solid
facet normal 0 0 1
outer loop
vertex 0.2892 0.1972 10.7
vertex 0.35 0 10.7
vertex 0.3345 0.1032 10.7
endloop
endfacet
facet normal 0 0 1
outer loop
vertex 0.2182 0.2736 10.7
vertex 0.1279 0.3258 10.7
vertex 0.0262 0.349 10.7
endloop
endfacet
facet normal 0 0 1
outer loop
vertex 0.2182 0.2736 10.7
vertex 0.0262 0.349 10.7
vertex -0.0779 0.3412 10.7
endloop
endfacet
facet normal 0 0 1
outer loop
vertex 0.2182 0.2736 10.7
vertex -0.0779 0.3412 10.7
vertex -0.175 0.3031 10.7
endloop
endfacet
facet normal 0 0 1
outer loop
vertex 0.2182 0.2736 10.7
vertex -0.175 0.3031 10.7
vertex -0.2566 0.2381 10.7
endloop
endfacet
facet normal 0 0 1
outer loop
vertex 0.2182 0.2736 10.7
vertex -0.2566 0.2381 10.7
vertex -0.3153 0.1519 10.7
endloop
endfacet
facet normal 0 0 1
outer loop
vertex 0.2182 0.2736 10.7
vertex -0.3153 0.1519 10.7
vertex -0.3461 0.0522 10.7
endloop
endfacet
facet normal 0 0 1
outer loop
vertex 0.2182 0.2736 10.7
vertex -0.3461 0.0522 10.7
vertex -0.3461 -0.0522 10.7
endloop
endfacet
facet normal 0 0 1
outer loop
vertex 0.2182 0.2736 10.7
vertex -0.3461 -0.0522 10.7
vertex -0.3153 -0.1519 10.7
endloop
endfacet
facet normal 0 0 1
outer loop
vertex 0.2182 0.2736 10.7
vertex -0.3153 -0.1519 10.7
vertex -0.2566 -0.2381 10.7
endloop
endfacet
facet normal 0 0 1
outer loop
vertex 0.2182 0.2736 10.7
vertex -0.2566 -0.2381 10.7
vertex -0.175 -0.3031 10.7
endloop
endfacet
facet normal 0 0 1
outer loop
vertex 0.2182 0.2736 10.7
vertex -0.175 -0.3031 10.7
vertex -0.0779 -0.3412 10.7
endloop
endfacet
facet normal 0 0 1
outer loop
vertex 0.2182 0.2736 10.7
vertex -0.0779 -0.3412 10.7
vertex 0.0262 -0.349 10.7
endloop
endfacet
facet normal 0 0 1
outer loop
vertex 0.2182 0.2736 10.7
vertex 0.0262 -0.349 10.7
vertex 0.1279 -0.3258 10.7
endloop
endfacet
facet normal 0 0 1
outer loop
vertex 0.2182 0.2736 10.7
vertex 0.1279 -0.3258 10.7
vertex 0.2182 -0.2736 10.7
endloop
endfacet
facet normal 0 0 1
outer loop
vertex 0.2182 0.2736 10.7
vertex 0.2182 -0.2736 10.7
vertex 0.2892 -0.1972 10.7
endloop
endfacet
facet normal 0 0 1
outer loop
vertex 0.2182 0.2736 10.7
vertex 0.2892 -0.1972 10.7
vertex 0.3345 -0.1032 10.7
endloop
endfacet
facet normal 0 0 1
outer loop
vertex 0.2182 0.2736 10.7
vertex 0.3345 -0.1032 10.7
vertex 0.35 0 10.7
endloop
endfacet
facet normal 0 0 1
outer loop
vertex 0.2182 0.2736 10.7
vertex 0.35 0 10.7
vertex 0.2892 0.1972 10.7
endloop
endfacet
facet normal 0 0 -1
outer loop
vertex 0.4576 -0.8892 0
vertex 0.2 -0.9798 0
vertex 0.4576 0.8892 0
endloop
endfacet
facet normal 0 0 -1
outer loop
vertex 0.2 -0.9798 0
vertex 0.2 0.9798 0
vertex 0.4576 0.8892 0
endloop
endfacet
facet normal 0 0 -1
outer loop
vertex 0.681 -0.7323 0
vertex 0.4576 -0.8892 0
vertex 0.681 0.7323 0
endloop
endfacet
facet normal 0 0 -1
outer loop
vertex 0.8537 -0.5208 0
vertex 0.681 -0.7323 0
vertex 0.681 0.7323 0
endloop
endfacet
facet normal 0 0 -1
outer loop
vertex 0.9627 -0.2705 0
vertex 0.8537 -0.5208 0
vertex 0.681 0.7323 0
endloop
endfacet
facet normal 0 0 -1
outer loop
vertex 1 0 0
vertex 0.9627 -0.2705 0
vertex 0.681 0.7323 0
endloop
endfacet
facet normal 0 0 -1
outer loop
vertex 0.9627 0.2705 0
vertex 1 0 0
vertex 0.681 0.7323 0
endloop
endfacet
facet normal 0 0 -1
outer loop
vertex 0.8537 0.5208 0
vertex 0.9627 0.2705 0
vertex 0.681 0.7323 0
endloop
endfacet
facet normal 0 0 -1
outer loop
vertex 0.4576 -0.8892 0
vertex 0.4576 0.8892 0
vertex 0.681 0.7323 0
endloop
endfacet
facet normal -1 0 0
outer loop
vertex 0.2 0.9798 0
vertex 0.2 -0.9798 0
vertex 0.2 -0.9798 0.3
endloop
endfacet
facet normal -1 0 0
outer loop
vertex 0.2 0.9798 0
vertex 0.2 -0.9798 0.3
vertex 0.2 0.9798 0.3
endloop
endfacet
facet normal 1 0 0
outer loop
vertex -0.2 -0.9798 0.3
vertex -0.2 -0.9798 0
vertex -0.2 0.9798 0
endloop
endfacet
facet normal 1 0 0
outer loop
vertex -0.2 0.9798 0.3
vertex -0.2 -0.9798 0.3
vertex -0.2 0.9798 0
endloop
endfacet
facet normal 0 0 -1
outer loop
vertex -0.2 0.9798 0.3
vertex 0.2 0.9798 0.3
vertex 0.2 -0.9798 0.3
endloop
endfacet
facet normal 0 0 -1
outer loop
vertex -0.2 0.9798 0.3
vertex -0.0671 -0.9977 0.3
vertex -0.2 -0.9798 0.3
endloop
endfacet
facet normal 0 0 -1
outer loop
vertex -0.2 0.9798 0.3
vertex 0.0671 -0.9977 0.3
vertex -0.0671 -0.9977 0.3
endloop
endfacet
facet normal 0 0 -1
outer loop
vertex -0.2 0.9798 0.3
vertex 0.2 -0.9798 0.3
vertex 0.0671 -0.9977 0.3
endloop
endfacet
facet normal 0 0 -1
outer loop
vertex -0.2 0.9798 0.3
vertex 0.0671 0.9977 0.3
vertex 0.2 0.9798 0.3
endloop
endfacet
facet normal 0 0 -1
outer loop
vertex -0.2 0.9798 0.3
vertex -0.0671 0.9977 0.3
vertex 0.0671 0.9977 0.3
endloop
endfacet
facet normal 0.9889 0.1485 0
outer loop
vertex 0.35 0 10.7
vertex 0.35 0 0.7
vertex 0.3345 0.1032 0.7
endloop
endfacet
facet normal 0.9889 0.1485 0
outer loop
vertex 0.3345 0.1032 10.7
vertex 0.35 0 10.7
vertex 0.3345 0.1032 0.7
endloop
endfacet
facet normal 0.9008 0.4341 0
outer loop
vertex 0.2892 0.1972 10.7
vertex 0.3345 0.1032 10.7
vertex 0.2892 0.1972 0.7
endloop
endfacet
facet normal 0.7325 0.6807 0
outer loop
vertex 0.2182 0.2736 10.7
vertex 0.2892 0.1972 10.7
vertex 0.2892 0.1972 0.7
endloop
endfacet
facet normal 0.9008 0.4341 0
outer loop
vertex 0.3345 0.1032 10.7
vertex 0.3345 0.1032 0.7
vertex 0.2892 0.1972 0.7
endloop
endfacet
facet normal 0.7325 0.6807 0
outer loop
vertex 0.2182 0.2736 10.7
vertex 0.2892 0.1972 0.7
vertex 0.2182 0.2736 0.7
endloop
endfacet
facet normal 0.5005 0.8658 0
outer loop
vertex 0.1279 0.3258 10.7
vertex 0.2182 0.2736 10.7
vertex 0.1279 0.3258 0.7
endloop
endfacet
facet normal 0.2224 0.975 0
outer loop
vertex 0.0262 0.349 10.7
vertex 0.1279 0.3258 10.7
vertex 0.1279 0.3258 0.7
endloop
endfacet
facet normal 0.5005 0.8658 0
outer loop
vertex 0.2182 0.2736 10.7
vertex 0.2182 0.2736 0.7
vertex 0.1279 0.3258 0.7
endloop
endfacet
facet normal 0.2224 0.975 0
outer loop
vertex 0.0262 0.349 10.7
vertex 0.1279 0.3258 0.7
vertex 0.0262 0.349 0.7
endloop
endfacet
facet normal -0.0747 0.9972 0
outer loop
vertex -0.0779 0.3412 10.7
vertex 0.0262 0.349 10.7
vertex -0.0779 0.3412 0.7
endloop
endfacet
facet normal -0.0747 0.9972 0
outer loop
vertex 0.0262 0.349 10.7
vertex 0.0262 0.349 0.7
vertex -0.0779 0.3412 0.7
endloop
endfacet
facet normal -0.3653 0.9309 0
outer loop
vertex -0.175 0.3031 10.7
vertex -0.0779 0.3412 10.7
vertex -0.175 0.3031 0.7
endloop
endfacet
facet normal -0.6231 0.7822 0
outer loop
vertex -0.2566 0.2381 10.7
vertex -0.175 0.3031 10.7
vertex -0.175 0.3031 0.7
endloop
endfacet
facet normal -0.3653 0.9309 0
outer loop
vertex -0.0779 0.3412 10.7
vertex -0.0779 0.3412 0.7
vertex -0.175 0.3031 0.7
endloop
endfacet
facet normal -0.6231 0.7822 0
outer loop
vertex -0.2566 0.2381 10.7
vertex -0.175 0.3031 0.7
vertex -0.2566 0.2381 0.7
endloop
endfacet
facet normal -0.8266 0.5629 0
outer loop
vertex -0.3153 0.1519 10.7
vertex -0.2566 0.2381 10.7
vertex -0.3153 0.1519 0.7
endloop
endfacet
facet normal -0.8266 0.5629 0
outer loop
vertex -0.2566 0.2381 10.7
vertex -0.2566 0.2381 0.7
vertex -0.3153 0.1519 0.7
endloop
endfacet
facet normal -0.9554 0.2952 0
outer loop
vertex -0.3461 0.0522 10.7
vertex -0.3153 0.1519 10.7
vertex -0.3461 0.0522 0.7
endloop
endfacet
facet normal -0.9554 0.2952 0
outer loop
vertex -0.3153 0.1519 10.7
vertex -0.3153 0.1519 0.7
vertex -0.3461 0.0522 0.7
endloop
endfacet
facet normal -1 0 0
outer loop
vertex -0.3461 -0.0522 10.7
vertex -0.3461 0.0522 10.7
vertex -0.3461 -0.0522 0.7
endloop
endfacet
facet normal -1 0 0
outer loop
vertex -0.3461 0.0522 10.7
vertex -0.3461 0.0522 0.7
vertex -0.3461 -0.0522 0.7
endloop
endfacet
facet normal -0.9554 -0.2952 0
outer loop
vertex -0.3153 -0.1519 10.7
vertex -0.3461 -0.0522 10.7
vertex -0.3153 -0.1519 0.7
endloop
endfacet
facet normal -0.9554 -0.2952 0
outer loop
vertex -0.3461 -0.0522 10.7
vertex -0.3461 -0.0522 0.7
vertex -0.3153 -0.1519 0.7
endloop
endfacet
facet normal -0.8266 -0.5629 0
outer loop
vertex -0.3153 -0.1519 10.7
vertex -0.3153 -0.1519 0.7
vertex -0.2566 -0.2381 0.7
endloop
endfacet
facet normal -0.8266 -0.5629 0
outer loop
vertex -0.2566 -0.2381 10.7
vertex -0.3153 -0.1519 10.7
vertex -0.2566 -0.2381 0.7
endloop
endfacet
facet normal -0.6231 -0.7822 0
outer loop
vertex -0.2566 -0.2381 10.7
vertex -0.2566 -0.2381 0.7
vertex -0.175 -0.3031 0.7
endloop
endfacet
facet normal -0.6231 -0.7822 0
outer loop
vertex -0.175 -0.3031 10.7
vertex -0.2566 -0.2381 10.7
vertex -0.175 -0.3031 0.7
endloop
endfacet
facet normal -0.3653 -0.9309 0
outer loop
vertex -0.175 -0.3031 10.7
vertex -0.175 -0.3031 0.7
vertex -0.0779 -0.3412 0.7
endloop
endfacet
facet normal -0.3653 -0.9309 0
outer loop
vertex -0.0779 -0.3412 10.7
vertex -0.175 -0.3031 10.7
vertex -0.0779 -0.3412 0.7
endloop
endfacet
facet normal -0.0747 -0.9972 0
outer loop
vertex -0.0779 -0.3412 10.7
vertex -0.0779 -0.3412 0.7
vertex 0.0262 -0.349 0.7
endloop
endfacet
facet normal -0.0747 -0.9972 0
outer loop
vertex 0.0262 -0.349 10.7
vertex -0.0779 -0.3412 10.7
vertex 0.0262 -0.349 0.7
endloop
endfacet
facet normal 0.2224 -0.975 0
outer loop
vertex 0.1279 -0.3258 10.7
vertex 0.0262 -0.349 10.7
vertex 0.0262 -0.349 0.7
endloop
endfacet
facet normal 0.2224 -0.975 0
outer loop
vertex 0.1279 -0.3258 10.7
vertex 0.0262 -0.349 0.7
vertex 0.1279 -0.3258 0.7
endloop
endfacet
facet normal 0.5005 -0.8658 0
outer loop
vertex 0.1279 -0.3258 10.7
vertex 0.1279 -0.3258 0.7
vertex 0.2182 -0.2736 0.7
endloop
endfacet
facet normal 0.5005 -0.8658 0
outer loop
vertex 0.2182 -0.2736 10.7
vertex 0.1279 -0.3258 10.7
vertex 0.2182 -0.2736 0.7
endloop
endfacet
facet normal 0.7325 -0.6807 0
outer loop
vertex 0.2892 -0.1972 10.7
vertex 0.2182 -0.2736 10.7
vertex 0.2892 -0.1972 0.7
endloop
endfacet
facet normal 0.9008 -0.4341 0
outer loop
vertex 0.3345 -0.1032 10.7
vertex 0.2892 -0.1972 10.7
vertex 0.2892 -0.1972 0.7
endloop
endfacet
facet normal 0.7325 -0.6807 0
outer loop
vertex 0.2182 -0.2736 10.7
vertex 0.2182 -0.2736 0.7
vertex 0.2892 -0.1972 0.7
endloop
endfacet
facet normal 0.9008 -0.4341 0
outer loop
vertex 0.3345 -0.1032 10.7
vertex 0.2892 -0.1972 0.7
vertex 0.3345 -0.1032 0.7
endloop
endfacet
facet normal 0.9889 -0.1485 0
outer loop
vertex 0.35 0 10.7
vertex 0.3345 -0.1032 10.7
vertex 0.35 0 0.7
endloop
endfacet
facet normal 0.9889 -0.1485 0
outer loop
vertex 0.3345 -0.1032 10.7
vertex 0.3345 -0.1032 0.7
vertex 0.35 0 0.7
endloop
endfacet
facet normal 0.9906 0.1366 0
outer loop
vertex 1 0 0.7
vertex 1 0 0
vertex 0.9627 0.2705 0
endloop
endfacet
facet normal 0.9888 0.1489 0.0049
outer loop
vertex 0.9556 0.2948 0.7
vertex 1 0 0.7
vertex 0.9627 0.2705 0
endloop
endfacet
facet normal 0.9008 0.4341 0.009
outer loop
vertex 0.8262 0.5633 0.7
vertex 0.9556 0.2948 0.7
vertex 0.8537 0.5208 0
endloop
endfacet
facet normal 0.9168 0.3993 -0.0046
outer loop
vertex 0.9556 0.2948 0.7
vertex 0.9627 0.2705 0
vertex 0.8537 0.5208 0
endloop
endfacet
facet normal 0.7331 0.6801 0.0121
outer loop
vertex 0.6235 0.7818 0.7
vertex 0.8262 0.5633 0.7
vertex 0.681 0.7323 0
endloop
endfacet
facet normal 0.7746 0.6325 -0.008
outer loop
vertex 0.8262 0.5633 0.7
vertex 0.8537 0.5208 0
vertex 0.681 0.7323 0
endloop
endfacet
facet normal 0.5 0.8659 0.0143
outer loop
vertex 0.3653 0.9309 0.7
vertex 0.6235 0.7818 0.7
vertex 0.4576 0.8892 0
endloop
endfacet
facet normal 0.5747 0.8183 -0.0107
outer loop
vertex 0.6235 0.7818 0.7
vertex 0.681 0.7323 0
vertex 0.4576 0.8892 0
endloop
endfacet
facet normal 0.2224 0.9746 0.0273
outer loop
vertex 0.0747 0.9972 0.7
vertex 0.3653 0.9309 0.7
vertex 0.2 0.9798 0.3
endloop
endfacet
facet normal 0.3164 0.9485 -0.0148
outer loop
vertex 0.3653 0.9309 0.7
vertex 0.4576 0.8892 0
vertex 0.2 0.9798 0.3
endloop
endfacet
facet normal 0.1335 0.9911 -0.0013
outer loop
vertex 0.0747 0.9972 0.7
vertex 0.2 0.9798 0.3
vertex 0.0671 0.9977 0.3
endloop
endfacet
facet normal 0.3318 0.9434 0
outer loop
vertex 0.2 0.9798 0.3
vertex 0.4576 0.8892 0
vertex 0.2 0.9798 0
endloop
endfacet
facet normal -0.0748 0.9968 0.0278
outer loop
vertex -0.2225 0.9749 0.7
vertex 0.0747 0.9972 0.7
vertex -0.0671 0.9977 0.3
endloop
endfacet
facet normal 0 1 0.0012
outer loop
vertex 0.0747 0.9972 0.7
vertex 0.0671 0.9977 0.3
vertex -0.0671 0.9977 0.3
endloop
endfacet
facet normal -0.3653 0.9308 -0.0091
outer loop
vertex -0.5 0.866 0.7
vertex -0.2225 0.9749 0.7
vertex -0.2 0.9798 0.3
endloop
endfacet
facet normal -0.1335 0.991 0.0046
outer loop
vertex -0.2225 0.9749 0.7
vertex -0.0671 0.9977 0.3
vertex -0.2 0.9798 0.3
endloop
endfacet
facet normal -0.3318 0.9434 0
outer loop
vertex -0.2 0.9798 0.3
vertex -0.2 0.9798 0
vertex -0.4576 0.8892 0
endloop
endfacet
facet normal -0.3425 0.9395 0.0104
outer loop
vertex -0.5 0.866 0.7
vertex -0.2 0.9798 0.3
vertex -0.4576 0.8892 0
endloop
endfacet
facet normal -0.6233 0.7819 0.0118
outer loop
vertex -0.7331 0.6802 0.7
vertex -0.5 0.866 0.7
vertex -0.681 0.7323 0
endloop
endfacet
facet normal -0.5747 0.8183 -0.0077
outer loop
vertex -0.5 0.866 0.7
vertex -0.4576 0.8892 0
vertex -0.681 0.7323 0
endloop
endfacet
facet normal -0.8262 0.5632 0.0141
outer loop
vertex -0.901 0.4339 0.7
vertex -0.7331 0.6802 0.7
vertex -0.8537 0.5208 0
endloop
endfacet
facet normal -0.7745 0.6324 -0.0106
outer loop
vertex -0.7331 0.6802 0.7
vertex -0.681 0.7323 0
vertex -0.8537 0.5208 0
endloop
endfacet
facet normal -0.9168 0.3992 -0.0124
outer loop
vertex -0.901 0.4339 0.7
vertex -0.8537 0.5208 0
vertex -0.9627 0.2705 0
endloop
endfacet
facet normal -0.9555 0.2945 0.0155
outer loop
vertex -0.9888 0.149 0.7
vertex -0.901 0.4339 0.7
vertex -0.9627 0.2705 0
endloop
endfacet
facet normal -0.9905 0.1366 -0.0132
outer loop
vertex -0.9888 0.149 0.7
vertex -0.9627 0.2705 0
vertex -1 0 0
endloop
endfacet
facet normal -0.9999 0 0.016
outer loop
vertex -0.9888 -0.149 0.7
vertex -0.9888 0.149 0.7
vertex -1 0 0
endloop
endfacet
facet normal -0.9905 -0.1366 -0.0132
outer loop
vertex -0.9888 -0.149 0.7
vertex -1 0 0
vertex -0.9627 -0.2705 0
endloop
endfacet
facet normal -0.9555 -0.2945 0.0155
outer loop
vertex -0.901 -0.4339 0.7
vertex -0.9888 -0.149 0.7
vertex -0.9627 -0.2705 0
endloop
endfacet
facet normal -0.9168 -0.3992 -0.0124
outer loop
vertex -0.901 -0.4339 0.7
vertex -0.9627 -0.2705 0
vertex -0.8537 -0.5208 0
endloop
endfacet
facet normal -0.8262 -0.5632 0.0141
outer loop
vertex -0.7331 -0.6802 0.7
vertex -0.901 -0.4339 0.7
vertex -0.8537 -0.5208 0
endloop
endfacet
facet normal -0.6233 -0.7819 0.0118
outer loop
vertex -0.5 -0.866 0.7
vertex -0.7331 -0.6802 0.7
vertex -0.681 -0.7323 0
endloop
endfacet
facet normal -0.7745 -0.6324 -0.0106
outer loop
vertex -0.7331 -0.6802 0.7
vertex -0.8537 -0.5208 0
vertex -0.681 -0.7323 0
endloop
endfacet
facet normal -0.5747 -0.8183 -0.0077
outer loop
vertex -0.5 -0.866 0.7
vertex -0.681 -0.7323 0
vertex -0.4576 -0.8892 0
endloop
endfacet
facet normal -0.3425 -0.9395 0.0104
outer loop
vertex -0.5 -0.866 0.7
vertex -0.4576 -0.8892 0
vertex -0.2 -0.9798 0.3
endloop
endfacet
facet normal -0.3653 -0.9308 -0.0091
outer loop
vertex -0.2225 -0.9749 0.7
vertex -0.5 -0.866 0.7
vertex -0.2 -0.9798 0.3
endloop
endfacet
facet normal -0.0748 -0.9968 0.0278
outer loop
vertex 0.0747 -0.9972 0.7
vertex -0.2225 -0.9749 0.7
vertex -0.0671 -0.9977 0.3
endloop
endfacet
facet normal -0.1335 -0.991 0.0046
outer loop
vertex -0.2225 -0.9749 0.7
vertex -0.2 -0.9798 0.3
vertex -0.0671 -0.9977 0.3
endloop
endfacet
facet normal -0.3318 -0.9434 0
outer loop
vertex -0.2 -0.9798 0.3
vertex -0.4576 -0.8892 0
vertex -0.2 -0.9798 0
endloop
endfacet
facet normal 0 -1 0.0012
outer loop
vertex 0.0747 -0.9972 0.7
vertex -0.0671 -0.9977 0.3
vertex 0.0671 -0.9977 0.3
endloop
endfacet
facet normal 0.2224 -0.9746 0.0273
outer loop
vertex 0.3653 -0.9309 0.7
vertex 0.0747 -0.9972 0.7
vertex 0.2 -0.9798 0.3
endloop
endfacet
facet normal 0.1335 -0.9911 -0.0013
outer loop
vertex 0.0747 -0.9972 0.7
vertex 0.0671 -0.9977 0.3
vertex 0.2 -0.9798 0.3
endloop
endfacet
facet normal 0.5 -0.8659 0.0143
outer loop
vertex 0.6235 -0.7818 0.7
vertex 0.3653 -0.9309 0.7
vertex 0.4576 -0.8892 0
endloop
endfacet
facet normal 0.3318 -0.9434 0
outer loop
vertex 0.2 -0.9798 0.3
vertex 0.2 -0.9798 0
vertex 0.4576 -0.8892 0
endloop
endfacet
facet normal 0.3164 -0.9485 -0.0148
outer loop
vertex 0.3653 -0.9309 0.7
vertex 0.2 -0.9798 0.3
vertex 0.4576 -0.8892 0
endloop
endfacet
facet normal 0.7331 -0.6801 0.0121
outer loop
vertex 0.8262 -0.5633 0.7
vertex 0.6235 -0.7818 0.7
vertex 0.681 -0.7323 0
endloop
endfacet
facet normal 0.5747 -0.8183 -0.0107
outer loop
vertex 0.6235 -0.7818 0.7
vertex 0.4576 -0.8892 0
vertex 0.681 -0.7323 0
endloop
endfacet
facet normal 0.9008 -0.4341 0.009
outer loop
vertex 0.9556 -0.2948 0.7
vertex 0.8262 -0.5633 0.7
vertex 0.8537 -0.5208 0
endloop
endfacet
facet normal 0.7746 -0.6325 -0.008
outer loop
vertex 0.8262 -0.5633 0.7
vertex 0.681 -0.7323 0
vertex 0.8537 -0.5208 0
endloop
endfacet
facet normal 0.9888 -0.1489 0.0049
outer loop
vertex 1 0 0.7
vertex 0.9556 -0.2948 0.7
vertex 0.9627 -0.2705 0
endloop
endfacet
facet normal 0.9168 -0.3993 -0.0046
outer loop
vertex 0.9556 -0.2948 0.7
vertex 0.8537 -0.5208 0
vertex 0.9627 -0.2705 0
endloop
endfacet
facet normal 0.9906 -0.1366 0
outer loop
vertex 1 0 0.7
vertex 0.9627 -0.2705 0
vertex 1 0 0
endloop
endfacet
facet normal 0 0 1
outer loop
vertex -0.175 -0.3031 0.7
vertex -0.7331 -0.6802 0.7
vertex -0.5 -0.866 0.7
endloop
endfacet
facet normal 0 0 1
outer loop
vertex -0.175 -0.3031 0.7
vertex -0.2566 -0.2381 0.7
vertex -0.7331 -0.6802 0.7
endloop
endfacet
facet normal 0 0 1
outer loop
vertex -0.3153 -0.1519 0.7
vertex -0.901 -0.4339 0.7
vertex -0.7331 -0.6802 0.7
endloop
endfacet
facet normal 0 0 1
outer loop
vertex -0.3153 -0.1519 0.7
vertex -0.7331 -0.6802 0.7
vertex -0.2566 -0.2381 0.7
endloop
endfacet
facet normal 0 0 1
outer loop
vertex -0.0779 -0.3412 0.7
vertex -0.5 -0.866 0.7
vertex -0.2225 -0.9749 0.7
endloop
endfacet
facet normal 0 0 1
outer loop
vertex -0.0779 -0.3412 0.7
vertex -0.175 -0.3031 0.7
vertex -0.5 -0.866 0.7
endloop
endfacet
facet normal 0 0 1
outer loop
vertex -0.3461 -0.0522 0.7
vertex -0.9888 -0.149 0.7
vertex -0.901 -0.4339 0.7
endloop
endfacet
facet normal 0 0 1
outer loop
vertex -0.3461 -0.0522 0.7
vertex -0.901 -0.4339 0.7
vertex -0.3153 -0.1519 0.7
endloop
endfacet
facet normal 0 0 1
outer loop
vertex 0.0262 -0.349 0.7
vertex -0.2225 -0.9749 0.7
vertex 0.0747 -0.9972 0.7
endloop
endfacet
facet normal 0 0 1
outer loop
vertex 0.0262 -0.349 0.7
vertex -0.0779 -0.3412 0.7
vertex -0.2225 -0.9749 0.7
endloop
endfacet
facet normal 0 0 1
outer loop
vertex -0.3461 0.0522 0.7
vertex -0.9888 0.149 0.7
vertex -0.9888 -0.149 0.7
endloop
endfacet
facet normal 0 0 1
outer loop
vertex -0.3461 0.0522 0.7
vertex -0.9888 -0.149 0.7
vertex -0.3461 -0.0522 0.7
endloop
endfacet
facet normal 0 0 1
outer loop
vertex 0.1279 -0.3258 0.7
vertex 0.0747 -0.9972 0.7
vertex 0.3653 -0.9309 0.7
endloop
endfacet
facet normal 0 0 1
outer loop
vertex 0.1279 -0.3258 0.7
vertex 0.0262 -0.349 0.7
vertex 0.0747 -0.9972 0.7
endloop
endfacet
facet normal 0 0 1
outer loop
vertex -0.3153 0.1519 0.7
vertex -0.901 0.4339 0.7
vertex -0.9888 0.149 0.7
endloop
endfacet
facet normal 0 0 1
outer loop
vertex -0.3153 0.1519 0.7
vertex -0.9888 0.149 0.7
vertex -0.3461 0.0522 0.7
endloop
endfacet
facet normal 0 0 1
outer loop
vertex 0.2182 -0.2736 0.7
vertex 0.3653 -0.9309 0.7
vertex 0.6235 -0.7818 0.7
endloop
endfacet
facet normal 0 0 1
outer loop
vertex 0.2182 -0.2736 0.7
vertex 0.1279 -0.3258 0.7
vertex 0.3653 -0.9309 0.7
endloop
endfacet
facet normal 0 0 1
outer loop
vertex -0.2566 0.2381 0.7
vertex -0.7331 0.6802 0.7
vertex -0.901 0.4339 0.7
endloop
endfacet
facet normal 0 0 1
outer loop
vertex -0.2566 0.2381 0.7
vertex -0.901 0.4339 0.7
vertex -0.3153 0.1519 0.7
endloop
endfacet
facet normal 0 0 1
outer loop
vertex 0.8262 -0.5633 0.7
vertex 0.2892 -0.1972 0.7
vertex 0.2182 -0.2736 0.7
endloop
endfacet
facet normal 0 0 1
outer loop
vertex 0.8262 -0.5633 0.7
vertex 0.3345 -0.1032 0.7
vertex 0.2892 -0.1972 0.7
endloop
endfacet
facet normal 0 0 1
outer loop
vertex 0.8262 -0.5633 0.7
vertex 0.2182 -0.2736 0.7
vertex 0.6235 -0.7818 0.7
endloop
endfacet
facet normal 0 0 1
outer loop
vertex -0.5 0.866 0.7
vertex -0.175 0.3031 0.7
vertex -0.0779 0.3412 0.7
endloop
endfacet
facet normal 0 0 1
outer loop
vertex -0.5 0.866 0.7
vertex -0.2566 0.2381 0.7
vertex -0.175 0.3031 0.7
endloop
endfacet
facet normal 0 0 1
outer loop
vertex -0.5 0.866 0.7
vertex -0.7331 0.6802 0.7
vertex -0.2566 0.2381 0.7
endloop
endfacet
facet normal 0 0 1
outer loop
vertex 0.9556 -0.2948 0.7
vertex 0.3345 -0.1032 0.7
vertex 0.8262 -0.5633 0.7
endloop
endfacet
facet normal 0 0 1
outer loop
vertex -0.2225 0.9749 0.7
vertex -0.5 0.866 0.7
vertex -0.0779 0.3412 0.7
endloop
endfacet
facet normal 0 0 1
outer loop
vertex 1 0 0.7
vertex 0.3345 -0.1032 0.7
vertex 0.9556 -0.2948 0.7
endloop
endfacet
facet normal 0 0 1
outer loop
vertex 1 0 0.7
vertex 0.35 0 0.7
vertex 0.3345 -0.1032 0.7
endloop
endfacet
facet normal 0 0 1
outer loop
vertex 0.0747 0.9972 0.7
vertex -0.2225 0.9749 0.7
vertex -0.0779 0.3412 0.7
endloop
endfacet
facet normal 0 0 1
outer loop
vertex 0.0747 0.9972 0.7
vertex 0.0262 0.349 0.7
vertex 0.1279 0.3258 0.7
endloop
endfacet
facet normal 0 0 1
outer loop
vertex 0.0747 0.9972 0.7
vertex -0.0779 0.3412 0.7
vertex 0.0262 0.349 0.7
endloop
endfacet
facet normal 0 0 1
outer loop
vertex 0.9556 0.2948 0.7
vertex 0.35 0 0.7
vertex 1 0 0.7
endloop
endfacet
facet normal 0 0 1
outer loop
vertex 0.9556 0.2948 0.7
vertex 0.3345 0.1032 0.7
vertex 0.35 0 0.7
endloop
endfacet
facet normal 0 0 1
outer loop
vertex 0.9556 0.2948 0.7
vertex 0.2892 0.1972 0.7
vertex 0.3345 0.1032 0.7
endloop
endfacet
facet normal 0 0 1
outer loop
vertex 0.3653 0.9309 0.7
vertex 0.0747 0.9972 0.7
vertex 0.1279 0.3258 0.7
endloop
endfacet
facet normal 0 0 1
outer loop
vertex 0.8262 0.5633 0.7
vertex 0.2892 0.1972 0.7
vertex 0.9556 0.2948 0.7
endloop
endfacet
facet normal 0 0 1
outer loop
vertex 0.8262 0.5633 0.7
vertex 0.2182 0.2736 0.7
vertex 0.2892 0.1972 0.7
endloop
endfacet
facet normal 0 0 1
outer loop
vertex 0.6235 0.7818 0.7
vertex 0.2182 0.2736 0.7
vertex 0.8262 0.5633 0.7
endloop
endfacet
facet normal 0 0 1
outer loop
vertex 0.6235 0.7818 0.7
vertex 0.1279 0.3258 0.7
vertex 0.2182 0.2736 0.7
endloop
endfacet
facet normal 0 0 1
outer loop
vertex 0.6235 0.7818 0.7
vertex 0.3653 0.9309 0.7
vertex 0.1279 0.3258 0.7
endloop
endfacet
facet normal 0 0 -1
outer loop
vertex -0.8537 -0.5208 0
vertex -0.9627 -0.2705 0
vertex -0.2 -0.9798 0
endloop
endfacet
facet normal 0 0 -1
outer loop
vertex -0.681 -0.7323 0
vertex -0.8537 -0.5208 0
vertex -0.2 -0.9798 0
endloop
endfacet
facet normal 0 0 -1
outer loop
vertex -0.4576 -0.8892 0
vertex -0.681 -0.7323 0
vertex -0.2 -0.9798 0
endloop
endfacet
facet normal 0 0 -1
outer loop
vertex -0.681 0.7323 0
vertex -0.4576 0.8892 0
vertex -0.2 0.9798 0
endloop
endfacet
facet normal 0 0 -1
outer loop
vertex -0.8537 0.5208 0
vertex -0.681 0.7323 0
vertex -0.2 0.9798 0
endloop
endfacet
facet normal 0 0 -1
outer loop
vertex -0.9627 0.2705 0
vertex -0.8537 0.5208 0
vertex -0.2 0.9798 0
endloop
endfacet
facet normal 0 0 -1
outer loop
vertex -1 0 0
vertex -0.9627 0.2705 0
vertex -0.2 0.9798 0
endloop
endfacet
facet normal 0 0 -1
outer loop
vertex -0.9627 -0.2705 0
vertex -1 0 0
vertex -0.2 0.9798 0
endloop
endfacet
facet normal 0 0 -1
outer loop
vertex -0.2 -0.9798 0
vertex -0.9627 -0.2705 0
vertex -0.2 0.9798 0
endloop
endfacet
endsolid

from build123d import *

# Parameters (mm, degrees)
SKETCH1_R           = 1
BOSS_EXTRUDE1_DEPTH = 0.7
SKETCH3_R           = 0.35
BOSS_EXTRUDE2_DEPTH = 10
SKETCH5_W           = 0.4
SKETCH5_H           = 2
CUT_EXTRUDE1_DEPTH  = 0.3


with BuildPart() as part:
    # Sketch1 → Boss-Extrude1 (new body)
    with BuildSketch(Plane.XY):
        Circle(SKETCH1_R)
    extrude(amount=BOSS_EXTRUDE1_DEPTH)

    # Sketch3 → Boss-Extrude2 (add)
    with BuildSketch(Plane.XY.offset(0.7)):
        Circle(SKETCH3_R)
    extrude(amount=BOSS_EXTRUDE2_DEPTH)

    # Sketch5 → Cut-Extrude1 (cut)
    with BuildSketch(Plane(origin=(0, 0, 0), x_dir=(-1, 0, 0), z_dir=(0, 0, -1))):
        Rectangle(SKETCH5_W, SKETCH5_H)
    extrude(amount=-CUT_EXTRUDE1_DEPTH, mode=Mode.SUBTRACT)


solid = part.part
